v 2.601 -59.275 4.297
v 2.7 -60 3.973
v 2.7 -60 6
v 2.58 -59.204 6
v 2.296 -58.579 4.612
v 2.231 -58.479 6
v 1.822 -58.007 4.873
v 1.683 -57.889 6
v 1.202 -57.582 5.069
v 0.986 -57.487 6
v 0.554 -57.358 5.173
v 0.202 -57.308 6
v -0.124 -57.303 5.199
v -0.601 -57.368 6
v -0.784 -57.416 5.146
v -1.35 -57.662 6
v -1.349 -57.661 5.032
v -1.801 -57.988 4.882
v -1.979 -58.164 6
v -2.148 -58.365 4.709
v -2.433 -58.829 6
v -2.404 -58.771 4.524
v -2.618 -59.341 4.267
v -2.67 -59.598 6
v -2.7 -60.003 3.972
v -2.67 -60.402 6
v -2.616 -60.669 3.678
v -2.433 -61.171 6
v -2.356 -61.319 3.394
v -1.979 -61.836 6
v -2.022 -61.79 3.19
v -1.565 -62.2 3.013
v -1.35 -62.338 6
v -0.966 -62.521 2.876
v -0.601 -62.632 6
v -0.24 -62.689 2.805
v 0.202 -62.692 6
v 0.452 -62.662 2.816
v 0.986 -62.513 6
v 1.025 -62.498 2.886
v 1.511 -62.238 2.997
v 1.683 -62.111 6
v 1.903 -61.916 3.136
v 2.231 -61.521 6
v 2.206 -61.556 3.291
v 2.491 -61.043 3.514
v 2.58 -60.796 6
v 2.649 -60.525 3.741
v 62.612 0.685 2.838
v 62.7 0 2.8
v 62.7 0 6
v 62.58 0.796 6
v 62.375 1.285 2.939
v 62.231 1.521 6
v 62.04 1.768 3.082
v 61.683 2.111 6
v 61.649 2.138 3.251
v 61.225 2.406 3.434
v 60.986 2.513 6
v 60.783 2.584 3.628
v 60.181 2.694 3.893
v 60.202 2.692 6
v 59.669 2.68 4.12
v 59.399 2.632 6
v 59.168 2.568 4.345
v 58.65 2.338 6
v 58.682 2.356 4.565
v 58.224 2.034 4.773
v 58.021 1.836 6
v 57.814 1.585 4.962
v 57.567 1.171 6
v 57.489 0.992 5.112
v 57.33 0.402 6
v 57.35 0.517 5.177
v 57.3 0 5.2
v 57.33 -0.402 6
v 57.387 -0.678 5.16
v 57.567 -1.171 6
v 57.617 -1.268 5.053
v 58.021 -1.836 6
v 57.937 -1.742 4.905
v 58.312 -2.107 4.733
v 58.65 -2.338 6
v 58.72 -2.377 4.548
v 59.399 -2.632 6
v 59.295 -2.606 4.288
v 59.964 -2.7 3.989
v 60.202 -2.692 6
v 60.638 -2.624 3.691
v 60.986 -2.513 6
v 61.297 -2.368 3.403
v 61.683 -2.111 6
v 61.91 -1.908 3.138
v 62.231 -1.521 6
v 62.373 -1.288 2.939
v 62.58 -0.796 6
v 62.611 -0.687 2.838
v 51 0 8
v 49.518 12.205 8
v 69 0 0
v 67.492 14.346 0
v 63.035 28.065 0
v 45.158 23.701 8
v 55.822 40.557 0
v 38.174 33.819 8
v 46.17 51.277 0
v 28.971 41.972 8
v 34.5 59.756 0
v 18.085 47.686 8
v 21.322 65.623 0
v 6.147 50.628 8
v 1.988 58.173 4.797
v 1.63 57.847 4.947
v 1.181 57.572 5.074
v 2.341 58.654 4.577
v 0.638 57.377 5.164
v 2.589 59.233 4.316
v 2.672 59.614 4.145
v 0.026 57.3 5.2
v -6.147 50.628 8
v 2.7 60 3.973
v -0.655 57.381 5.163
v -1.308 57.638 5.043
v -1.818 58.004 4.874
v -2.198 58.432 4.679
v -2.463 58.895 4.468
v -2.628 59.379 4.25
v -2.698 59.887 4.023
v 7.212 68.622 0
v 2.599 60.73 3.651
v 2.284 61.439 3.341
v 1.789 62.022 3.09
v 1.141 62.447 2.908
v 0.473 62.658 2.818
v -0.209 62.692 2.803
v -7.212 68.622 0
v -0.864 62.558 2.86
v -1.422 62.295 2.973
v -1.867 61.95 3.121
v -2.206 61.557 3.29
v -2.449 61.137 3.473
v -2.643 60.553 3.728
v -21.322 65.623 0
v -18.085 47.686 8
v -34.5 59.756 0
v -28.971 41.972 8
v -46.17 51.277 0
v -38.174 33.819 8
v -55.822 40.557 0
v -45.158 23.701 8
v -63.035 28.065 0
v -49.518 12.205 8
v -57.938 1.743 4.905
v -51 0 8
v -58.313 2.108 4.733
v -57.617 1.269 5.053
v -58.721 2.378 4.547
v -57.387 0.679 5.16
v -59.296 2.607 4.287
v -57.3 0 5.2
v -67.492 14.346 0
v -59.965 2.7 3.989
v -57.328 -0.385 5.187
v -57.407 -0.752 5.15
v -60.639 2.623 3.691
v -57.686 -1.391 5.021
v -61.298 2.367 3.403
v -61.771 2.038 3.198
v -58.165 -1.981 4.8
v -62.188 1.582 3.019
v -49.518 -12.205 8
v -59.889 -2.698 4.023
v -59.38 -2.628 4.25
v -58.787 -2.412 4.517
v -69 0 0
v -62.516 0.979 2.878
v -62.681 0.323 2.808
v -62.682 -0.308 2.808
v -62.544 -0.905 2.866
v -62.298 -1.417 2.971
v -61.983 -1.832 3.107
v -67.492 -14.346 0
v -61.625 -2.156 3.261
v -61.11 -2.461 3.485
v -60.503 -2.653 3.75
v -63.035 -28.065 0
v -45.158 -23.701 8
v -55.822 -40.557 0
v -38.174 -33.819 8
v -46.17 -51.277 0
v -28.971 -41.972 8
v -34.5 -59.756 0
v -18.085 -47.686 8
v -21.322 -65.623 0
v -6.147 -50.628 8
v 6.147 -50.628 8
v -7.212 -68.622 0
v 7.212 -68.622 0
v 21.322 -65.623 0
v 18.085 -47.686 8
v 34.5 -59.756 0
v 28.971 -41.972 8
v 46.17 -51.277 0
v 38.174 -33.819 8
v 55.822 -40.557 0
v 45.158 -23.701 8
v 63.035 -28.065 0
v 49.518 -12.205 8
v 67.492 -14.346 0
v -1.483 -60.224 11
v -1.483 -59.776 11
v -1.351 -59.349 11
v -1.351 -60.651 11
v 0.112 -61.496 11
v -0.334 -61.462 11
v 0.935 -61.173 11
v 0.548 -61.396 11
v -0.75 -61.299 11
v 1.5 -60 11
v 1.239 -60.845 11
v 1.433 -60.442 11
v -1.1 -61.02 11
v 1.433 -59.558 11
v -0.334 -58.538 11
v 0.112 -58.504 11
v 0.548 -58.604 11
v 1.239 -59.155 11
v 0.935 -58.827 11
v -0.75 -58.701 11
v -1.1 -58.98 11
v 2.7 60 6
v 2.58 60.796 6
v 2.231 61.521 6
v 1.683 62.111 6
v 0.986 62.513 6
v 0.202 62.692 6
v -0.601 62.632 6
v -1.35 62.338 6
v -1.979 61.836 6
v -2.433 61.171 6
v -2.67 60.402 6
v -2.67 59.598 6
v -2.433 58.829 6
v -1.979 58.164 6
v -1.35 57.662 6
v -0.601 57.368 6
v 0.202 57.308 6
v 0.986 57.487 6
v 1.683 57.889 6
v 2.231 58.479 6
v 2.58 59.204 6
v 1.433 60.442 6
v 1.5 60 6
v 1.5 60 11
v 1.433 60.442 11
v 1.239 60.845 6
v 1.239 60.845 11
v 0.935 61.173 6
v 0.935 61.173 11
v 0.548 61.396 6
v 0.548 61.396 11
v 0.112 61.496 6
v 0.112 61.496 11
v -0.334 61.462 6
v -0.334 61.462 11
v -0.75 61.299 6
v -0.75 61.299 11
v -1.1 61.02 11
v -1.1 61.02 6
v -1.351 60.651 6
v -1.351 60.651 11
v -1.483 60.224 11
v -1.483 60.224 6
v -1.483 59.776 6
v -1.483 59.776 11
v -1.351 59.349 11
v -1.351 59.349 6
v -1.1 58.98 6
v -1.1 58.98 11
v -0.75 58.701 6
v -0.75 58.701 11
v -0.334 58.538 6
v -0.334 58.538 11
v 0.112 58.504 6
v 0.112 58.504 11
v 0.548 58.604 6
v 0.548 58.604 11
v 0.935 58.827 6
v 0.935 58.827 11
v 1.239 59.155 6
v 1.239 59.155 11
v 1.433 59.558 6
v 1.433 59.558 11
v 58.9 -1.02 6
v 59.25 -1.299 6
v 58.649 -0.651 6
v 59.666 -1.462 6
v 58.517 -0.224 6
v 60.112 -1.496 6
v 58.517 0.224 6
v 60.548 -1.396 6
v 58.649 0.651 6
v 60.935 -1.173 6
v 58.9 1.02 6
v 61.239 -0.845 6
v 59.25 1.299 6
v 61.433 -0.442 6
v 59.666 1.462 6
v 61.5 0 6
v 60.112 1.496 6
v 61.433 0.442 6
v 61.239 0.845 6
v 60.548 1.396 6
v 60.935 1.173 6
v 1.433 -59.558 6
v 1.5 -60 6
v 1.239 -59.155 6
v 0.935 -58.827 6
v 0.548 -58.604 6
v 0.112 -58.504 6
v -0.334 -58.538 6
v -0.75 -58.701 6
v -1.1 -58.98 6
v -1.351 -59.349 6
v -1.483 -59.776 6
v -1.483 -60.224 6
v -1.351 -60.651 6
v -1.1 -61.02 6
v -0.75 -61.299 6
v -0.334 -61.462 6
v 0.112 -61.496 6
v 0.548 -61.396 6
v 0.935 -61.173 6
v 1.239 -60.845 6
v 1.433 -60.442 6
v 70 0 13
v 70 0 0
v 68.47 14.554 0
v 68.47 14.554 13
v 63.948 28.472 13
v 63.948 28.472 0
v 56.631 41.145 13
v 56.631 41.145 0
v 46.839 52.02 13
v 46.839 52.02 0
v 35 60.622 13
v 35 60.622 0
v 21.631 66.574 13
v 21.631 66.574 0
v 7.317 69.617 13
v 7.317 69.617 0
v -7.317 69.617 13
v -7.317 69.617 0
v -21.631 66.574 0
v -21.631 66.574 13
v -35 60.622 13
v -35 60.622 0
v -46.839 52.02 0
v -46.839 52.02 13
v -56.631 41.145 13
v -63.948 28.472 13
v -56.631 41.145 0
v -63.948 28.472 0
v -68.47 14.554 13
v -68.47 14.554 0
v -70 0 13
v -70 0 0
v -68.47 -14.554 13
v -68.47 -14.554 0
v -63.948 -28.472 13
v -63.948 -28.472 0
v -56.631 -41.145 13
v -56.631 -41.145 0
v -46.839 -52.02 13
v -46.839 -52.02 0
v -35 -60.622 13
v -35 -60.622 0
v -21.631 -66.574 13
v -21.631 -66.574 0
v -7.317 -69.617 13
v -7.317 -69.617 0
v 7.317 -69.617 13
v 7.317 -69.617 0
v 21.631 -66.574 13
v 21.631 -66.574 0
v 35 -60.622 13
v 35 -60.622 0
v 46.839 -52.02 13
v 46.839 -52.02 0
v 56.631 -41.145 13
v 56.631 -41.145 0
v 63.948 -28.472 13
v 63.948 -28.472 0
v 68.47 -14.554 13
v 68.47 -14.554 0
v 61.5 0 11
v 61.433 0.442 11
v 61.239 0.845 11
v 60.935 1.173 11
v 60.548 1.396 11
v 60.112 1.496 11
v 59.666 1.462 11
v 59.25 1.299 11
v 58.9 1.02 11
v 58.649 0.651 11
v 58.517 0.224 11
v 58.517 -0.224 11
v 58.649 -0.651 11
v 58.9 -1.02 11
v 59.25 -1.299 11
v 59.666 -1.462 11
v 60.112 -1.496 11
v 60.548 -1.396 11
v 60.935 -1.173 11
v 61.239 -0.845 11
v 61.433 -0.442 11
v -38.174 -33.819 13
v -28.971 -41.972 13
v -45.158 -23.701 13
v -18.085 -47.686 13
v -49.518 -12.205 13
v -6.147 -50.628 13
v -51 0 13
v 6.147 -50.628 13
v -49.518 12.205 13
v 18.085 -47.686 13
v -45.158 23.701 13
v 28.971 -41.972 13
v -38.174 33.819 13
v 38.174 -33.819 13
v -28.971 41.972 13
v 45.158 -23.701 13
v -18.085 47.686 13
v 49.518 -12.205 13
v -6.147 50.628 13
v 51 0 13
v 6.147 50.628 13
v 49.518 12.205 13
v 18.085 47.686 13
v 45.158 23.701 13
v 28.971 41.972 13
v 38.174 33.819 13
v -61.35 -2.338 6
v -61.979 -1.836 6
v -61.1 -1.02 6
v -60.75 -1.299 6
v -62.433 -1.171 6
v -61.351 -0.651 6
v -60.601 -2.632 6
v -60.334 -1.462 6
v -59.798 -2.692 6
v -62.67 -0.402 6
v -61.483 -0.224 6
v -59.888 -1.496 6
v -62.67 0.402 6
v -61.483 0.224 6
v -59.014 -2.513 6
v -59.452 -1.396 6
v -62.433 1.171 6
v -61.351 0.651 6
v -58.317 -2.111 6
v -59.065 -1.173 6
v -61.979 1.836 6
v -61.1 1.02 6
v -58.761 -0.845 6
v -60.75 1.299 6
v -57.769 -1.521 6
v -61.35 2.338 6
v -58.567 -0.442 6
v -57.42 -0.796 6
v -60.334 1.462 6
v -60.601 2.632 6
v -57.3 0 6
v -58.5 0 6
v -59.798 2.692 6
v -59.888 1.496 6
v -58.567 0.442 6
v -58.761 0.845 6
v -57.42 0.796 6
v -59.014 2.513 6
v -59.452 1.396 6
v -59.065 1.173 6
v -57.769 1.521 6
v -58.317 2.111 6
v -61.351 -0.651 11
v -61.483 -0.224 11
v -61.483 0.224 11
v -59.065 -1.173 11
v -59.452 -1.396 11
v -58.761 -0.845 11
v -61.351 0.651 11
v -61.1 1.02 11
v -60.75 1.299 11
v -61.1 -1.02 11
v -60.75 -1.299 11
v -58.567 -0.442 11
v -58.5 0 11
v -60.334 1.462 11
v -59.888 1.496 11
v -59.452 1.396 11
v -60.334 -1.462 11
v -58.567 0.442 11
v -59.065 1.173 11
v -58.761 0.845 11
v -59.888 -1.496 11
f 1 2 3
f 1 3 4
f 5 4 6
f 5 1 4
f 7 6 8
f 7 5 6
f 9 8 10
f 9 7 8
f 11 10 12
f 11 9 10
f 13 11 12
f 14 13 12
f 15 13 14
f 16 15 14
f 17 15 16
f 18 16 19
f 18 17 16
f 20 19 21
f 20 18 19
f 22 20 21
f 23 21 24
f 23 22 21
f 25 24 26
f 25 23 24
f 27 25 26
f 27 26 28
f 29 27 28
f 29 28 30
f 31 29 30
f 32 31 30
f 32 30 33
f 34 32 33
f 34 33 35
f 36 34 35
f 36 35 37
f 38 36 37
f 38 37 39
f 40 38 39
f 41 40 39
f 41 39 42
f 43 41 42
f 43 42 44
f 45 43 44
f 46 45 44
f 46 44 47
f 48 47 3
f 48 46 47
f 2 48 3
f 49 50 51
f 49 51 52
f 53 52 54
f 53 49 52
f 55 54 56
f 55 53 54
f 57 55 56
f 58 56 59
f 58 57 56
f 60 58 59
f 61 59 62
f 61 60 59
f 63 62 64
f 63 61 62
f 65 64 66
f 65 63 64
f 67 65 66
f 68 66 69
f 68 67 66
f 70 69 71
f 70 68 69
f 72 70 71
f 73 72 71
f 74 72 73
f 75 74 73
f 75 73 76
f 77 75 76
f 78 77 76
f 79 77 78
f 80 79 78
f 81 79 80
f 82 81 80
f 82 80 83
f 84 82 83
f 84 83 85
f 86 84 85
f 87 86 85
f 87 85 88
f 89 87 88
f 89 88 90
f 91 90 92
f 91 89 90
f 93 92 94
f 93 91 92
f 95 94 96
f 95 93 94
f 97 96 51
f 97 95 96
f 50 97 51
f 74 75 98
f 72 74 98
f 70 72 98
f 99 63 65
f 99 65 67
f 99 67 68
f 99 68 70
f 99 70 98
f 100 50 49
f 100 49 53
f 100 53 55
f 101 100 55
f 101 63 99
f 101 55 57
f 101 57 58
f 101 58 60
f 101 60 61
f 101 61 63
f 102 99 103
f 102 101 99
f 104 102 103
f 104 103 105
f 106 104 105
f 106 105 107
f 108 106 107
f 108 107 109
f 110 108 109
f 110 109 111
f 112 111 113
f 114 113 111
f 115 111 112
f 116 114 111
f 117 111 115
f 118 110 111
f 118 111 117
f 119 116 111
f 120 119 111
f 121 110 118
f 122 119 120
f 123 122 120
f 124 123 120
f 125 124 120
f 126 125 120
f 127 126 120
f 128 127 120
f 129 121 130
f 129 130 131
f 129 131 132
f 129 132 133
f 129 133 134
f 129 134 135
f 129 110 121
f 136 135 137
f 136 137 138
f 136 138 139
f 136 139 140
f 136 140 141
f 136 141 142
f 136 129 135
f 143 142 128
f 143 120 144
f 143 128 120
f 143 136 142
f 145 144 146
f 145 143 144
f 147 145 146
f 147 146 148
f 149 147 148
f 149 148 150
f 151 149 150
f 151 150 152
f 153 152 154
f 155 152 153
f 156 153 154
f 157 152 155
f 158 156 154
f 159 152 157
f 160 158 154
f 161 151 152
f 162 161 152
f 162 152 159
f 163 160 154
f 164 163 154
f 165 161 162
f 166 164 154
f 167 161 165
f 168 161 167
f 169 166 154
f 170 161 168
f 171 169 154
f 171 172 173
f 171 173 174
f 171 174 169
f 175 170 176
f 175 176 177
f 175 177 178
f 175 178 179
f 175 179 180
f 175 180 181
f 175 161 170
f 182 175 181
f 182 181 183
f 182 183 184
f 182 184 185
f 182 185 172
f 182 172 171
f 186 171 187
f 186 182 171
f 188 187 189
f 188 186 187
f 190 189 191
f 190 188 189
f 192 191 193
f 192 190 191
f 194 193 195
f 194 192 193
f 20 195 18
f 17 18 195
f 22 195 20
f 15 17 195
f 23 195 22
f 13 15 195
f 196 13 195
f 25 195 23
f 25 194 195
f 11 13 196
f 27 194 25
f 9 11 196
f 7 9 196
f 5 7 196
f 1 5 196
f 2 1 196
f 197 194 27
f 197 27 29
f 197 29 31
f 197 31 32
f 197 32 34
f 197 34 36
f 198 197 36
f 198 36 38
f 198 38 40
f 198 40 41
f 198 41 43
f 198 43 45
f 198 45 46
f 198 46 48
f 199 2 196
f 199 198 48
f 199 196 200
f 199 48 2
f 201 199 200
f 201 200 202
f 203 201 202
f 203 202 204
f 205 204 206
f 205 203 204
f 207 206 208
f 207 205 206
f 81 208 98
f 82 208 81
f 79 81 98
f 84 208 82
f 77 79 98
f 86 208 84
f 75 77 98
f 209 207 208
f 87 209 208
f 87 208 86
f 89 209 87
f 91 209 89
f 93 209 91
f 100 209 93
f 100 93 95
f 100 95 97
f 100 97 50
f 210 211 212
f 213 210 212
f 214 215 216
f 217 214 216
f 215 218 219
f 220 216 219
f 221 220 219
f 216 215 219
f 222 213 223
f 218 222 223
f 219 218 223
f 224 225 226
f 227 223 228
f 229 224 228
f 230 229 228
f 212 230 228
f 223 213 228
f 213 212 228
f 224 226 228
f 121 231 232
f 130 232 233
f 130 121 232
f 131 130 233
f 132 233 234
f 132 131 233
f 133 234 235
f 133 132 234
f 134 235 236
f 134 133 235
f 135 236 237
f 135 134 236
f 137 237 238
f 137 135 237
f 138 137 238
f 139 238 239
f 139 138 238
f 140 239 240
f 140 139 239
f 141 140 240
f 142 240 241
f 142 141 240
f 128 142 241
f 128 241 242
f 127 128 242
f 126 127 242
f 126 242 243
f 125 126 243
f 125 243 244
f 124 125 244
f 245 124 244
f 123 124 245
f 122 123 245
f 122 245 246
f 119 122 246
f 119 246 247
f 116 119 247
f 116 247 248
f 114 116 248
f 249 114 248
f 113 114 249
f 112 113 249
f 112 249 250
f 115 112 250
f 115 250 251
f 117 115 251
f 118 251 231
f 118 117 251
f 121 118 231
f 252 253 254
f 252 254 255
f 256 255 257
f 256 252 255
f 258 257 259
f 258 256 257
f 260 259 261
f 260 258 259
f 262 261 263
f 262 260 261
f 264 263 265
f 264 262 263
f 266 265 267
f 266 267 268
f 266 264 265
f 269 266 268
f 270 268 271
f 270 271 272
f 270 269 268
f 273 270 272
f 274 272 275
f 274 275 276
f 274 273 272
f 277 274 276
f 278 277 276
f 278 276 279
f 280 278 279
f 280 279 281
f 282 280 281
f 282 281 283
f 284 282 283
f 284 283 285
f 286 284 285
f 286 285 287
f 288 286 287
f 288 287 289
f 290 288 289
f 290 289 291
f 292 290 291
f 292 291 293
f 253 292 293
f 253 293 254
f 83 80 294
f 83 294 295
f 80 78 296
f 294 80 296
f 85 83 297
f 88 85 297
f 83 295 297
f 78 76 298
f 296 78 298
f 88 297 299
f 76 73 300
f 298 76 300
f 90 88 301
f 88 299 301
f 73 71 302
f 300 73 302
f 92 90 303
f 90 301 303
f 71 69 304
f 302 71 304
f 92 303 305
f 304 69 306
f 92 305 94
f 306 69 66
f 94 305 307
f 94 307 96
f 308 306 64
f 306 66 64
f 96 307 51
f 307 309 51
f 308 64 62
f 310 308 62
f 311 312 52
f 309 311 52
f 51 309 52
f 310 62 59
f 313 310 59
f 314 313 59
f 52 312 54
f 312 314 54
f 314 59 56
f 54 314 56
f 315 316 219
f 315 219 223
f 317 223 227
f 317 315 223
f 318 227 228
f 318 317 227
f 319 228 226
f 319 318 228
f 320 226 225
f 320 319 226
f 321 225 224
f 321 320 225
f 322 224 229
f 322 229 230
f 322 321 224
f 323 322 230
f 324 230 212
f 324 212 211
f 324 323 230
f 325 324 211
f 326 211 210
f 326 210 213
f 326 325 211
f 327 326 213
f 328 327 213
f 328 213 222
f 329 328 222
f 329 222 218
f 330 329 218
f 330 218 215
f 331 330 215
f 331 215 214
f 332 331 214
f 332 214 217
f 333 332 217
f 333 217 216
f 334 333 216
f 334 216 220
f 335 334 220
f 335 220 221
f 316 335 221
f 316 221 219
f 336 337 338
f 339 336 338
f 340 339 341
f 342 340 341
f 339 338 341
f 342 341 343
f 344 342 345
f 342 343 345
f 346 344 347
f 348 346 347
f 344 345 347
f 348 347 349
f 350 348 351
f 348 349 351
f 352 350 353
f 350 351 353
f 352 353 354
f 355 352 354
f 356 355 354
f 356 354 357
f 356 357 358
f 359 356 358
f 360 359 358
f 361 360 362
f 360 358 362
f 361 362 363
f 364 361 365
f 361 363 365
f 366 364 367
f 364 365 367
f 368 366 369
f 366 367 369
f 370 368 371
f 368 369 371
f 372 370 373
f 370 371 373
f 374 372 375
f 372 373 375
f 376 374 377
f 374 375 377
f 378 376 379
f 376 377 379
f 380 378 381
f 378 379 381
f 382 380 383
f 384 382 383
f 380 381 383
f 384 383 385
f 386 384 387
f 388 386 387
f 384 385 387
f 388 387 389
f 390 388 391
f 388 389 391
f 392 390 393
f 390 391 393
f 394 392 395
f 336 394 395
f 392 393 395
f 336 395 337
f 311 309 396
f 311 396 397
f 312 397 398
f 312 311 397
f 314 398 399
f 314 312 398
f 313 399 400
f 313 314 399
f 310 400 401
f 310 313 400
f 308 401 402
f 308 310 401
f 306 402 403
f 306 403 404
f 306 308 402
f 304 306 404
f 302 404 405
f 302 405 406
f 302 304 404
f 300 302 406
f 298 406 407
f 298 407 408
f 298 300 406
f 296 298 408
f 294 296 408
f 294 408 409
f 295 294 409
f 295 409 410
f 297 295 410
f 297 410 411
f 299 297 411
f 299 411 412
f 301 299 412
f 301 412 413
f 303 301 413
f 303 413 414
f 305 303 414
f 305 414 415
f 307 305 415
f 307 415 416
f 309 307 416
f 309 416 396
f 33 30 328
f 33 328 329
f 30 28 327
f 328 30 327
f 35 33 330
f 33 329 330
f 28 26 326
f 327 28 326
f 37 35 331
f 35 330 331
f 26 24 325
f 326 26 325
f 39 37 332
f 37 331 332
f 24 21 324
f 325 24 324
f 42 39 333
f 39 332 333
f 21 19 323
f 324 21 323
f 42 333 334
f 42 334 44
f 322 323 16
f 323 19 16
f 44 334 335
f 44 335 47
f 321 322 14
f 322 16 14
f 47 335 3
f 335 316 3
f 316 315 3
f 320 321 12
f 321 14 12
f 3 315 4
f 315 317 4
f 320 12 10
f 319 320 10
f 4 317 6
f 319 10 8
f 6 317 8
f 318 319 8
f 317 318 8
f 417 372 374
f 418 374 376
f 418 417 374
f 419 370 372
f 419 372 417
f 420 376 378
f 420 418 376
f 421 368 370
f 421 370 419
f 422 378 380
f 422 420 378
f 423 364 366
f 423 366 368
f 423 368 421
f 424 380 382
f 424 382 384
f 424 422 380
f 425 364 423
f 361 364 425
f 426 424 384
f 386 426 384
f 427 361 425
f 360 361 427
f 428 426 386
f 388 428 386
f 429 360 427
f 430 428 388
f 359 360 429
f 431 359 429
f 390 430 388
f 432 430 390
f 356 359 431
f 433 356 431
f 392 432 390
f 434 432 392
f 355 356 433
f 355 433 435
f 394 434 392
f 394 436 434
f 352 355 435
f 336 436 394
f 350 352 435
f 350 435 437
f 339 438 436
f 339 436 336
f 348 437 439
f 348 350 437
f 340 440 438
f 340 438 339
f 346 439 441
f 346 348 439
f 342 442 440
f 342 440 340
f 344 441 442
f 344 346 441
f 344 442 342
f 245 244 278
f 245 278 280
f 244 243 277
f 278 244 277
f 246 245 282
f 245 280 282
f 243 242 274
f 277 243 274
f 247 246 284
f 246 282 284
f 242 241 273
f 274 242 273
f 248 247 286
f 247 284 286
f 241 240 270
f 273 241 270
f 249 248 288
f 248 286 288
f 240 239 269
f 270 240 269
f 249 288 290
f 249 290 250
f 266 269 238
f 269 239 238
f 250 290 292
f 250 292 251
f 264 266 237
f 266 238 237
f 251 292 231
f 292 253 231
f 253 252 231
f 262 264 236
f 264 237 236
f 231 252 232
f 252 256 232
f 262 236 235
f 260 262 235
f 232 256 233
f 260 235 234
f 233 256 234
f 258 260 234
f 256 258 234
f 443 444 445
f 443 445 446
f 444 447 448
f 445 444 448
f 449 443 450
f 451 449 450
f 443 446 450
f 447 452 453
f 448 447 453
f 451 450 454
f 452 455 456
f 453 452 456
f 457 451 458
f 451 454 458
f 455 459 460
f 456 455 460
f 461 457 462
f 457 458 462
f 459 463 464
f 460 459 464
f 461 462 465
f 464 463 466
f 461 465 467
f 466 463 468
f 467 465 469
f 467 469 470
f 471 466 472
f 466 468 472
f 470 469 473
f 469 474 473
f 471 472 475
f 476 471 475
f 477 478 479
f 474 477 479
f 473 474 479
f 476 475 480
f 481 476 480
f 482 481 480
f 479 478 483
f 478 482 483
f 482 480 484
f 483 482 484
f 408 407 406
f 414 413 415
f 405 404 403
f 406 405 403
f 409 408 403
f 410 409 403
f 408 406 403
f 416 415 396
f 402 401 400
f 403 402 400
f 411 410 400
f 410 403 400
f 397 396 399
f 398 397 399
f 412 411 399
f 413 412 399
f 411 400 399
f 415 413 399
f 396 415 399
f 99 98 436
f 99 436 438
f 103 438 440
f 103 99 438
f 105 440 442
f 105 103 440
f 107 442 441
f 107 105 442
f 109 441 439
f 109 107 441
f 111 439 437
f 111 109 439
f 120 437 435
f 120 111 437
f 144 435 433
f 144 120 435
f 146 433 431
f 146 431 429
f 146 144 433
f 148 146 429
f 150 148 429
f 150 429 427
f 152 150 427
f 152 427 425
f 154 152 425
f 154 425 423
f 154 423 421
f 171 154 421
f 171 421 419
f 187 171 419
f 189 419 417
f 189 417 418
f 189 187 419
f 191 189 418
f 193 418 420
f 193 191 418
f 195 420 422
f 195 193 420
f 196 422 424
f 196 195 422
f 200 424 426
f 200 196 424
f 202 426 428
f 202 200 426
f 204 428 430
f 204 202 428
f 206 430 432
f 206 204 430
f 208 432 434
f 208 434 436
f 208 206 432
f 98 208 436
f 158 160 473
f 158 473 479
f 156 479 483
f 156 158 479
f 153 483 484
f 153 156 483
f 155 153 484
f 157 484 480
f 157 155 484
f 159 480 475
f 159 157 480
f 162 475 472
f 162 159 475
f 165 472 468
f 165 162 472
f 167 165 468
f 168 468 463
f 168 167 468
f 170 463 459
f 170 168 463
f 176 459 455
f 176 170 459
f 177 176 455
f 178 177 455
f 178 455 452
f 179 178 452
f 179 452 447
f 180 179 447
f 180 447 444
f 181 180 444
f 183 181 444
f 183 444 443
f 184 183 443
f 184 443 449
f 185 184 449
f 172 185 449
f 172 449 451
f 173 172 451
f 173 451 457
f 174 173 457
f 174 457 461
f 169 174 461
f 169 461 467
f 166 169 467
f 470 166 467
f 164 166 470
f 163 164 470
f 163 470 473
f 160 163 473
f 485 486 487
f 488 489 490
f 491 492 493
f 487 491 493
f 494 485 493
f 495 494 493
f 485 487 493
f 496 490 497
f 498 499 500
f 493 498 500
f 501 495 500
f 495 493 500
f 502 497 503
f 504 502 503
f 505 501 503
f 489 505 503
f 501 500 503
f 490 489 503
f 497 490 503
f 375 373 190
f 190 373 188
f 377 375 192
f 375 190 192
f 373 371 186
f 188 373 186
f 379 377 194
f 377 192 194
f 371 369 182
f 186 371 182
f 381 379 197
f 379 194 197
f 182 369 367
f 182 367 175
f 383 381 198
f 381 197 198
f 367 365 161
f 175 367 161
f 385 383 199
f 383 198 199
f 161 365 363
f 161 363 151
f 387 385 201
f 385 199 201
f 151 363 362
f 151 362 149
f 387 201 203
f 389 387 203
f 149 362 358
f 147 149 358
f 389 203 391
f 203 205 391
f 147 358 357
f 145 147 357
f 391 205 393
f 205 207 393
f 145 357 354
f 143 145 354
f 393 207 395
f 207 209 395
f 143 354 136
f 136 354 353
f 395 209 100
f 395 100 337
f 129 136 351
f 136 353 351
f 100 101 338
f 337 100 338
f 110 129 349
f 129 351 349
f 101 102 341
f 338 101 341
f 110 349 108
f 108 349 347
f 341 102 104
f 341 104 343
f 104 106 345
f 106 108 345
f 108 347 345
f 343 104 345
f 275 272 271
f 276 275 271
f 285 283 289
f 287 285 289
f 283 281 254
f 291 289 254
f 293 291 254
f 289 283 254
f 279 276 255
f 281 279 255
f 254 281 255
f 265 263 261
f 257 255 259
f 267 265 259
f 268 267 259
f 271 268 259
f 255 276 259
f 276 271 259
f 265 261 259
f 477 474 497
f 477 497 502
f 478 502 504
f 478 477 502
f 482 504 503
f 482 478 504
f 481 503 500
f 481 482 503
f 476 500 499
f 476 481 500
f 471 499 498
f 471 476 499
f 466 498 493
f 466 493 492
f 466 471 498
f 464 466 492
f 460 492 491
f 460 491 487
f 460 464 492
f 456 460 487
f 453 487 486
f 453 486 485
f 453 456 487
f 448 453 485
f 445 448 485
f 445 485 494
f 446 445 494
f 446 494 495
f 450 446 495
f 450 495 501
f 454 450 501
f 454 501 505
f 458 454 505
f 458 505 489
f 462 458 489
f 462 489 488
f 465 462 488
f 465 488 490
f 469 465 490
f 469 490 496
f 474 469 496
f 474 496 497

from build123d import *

# Parameters (mm, degrees)
EXPORT_R        = 70
EXPORT_R_2      = 51
PAD_DEPTH       = 13
CHAMFER_SIZE2   = 18
CHAMFER_SIZE    = 8
EXPORT001_R     = 1.5
POCKET_DEPTH    = 11
EXPORT002_R     = 2.7
POCKET001_DEPTH = 6


with BuildPart() as part:
    # Export → Pad (new body)
    with BuildSketch(Plane.XY):
        Circle(EXPORT_R)
        Circle(EXPORT_R_2, mode=Mode.SUBTRACT)
    extrude(amount=PAD_DEPTH)

    # Chamfer
    chamfer_edges = [part.edges().sort_by_distance(p)[0] for p in [
        (-51, 0, 0),
    ]]
    chamfer_side = part.faces().sort_by_distance((-51, 0, 6.5))[0]
    chamfer(chamfer_edges, length=CHAMFER_SIZE, length2=CHAMFER_SIZE2, reference=chamfer_side)

    # Export001 → Pocket (cut)
    with BuildSketch(Plane.XY):
        with Locations((0, 60)):
            Circle(EXPORT001_R)
        with Locations((60, 0)):
            Circle(EXPORT001_R)
        with Locations((0, -60)):
            Circle(EXPORT001_R)
        with Locations((-60, 0)):
            Circle(EXPORT001_R)
    extrude(amount=POCKET_DEPTH, mode=Mode.SUBTRACT)

    # Export002 → Pocket001 (cut)
    with BuildSketch(Plane.XY):
        with Locations((-60, 0)):
            Circle(EXPORT002_R)
        with Locations((0, -60)):
            Circle(EXPORT002_R)
        with Locations((0, 60)):
            Circle(EXPORT002_R)
        with Locations((60, 0)):
            Circle(EXPORT002_R)
    extrude(amount=POCKET001_DEPTH, mode=Mode.SUBTRACT)


solid = part.part
